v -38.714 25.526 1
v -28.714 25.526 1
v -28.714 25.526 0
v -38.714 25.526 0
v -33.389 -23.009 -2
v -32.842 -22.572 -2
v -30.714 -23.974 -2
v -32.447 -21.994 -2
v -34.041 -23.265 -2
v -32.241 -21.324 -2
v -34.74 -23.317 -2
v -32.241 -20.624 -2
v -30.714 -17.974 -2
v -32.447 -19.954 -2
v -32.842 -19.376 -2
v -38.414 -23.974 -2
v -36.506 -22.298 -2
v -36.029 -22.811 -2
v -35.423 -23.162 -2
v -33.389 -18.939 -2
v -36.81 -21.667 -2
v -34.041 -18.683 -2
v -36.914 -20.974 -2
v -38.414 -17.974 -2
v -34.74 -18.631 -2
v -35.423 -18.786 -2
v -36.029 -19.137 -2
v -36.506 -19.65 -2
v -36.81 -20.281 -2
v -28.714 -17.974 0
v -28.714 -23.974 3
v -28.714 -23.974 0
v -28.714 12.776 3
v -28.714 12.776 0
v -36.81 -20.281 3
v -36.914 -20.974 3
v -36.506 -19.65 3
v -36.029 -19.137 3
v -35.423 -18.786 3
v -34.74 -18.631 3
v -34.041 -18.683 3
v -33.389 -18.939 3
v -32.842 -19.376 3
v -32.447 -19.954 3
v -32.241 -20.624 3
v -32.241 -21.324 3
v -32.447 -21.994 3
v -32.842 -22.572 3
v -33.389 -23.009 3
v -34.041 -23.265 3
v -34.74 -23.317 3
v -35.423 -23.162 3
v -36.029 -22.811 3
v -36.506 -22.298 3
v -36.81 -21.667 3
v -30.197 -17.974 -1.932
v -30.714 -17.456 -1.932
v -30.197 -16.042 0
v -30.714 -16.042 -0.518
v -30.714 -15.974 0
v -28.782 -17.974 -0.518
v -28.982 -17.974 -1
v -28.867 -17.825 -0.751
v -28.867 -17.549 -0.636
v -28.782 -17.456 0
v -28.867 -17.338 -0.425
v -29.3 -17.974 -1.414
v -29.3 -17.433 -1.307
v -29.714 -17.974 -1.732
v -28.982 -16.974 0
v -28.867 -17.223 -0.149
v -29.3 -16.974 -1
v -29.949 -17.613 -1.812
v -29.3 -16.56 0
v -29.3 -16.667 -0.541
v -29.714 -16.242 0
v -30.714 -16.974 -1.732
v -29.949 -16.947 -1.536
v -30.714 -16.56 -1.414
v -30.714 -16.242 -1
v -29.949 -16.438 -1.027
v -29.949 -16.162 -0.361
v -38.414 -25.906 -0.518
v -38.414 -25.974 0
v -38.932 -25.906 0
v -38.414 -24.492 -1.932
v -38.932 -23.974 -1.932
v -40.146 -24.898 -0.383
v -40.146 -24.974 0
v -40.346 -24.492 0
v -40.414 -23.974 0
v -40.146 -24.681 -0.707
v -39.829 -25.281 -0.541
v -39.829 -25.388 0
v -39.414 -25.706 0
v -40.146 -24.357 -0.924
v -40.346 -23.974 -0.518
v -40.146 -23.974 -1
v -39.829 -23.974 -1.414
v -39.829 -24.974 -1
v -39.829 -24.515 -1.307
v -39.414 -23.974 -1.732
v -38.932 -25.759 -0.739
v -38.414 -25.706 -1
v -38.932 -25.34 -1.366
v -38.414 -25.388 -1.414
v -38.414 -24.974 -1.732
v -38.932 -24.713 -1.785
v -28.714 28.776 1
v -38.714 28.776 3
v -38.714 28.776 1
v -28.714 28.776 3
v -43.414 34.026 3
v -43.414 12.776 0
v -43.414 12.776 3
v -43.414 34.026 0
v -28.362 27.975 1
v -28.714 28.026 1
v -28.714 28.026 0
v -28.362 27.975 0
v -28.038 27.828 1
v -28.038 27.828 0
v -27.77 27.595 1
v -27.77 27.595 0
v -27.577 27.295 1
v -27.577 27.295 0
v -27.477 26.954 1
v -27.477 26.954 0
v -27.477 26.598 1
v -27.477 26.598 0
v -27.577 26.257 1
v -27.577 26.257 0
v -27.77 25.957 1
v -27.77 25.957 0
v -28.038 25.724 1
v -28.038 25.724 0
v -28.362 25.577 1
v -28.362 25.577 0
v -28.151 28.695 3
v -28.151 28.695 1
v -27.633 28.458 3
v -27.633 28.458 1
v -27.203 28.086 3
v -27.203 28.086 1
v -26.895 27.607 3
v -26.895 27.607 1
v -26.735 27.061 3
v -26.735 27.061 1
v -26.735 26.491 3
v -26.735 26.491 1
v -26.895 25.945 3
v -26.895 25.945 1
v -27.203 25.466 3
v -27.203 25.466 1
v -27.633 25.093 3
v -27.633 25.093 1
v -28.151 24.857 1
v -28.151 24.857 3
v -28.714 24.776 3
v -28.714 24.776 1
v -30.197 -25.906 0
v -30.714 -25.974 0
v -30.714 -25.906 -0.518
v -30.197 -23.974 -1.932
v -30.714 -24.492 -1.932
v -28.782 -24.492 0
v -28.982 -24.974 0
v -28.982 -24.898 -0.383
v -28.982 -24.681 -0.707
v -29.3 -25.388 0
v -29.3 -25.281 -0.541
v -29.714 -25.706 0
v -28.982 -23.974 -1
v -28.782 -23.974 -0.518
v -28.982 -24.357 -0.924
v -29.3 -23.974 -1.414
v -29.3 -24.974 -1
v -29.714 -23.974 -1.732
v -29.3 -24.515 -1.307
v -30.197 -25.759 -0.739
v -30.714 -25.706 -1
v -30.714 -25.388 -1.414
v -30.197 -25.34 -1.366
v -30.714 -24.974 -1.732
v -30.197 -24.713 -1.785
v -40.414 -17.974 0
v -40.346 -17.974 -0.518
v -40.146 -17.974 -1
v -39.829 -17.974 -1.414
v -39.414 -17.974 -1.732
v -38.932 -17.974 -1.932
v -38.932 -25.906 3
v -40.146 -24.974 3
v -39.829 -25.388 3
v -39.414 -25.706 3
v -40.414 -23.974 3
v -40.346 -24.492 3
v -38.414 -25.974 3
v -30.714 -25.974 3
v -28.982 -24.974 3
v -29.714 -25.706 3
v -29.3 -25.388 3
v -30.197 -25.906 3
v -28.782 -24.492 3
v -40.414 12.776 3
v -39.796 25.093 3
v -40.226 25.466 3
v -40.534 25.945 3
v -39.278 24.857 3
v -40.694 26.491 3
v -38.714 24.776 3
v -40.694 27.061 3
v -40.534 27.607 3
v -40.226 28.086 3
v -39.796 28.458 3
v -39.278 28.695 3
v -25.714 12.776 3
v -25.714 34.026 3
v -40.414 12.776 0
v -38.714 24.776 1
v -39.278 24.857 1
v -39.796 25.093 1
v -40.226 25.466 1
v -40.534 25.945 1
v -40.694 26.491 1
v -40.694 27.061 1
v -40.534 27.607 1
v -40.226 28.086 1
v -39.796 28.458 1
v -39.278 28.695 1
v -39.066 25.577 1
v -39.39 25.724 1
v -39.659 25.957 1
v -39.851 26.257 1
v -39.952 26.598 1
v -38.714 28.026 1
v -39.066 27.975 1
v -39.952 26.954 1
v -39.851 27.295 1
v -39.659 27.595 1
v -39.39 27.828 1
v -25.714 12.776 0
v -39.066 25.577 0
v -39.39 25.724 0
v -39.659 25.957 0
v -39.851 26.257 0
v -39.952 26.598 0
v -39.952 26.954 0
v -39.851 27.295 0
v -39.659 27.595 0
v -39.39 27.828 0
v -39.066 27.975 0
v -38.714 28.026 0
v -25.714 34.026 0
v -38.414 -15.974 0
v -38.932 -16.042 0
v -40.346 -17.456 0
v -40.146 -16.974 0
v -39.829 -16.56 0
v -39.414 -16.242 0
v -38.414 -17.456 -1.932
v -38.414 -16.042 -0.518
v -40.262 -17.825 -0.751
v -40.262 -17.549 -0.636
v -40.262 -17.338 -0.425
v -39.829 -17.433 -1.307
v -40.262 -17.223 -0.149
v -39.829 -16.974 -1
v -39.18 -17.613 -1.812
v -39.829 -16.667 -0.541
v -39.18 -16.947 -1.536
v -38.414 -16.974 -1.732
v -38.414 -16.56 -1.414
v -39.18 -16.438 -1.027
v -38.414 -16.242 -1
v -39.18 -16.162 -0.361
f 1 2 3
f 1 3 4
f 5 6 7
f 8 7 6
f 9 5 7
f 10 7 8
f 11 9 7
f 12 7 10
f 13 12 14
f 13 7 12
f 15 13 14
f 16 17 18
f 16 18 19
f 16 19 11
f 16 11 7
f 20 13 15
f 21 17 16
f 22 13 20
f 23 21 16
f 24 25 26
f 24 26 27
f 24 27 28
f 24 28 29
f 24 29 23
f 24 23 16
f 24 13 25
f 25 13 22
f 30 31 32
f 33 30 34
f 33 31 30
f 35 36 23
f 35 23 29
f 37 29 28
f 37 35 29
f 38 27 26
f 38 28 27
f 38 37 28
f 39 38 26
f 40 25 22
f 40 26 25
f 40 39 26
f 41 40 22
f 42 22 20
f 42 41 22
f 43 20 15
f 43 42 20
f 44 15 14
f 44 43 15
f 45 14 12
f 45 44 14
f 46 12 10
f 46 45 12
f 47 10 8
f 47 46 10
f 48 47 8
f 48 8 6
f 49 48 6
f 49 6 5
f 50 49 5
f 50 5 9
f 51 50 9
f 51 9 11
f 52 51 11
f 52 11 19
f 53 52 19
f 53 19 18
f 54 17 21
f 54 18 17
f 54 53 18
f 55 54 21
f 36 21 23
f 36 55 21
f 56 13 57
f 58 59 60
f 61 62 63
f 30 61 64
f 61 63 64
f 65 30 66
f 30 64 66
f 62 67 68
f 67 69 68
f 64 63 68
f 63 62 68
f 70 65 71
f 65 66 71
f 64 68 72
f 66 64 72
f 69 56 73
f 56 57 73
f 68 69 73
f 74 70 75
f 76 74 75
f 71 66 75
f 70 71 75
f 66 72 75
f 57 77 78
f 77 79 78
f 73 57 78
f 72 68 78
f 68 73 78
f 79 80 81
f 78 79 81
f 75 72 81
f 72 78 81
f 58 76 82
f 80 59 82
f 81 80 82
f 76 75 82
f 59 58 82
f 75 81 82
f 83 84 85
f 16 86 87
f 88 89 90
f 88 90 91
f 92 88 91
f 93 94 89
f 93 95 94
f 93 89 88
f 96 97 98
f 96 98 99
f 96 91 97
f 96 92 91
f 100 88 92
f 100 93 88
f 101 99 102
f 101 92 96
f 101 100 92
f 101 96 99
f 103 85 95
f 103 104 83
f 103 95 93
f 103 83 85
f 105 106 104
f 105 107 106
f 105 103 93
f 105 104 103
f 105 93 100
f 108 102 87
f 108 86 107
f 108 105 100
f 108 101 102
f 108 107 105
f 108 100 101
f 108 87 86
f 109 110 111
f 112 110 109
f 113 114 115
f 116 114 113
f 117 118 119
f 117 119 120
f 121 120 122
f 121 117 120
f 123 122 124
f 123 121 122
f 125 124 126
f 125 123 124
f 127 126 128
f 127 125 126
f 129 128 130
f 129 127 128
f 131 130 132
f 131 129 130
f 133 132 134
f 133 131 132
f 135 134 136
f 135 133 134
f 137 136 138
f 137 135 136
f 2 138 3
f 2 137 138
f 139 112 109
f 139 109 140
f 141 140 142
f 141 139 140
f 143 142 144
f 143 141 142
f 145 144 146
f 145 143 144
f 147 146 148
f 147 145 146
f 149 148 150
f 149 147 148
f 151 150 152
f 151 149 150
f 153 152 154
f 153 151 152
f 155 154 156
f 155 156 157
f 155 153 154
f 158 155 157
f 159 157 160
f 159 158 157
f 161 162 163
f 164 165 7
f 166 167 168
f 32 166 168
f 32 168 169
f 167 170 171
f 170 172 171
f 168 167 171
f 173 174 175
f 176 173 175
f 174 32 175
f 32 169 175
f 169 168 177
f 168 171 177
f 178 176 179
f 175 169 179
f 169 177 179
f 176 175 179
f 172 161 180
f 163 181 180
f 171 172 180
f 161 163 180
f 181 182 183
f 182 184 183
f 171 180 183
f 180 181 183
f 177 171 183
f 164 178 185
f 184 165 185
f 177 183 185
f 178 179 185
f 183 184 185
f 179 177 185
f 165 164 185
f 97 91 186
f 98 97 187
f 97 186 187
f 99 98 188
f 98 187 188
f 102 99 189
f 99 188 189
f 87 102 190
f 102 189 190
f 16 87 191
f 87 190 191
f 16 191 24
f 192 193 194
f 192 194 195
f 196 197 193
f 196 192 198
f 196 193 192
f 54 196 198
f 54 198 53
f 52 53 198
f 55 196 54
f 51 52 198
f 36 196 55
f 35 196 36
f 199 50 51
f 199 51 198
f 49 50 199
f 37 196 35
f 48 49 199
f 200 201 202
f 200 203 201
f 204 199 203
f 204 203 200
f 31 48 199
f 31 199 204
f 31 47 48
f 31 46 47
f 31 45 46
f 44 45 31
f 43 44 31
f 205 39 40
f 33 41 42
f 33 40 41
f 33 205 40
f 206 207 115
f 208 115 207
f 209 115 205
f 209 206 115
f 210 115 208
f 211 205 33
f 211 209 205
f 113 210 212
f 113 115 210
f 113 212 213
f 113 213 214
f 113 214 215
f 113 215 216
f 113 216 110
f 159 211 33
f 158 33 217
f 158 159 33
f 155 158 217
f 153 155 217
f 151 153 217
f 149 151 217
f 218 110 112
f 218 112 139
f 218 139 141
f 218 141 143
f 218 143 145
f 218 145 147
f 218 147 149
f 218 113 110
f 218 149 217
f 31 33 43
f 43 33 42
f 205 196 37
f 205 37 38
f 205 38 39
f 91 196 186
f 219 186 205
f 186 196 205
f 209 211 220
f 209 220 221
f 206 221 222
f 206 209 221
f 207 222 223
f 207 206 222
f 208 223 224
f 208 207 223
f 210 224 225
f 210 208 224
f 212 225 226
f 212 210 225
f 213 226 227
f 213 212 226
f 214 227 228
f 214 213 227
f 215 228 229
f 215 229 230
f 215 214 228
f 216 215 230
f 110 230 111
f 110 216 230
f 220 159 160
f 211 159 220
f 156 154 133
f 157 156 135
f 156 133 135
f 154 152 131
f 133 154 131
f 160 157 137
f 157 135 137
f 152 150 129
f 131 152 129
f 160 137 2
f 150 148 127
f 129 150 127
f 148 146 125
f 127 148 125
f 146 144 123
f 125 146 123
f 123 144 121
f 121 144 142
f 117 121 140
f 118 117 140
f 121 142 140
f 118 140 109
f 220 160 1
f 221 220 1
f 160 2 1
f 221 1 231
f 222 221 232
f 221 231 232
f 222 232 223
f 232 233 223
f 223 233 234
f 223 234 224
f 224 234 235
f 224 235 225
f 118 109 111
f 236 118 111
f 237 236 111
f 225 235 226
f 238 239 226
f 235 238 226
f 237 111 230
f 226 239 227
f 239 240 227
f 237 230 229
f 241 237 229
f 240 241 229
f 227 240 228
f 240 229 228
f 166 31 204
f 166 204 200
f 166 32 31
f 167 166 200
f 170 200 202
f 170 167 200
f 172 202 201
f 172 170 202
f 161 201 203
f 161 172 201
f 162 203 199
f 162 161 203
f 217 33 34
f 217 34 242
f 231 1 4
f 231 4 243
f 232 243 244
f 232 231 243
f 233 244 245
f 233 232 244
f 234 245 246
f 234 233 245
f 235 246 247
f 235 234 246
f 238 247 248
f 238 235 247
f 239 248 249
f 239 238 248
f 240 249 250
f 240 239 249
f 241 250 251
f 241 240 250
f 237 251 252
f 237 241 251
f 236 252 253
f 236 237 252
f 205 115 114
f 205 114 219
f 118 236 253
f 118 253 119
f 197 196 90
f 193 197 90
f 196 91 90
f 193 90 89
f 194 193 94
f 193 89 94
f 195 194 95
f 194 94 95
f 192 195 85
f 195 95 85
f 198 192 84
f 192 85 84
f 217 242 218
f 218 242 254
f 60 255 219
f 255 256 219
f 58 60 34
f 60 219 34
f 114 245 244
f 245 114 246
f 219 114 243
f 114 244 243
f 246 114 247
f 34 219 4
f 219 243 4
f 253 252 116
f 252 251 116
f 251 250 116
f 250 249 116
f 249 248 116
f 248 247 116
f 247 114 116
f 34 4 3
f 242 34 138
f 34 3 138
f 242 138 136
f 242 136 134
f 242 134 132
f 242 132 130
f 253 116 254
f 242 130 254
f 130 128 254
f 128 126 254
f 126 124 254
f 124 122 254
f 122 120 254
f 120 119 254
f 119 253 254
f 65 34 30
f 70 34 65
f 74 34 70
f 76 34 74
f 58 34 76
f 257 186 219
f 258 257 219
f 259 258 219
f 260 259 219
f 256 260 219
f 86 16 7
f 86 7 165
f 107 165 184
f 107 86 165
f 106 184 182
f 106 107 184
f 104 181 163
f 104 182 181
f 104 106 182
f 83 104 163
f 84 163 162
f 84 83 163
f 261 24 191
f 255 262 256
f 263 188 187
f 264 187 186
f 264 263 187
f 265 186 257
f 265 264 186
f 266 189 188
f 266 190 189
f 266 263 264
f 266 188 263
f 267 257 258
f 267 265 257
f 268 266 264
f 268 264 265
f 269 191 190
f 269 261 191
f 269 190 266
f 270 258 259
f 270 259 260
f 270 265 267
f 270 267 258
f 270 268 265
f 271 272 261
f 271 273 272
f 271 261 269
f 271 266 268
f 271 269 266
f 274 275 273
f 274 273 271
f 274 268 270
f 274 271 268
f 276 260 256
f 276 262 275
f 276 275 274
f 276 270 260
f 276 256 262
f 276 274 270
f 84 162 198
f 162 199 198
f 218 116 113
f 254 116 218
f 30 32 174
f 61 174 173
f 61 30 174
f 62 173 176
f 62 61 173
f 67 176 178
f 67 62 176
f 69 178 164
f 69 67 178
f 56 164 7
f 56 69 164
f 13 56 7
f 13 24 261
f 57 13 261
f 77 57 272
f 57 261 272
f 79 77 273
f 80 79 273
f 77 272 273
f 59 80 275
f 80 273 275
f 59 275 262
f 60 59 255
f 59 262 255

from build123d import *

# Parameters (mm, degrees)
SKETCH1_W               = 17.7
SKETCH1_H               = 60
BOSS_EXTRUDE1_DEPTH     = 3
SKETCH2_W               = 3
SKETCH2_H               = 38.75
CUT_EXTRUDE1_DEPTH      = 56.240991234
CUT_EXTRUDE2_DEPTH      = 56.240991234
CUT_EXTRUDE3_DEPTH      = 2
SKETCH5_W               = 11.7
SKETCH5_H               = 10
BOSS_EXTRUDE2_DEPTH     = 2
CUT_EXTRUDE4_DEPTH      = 56.385621893
CUT_EXTRUDE4_DEPTH_BACK = 56.385621893
SKETCH6_R               = 2.35
FILLET1_R               = 2
FILLET2_R               = 2
FILLET3_R               = 2
FILLET4_R               = 2


with BuildPart() as part:
    # Sketch1 → Boss-Extrude1 (new body)
    with BuildSketch(Plane.XY):
        with Locations((-34.564285714, 4.025974026)):
            Rectangle(SKETCH1_W, SKETCH1_H)
    extrude(amount=BOSS_EXTRUDE1_DEPTH)

    # Sketch2 → Cut-Extrude1 (cut, through all)
    with BuildSketch(Plane.XY.offset(3)):
        with Locations((-41.914285714, -6.599025974)):
            Rectangle(SKETCH2_W, SKETCH2_H)
        with Locations((-27.214285714, -6.599025974)):
            Rectangle(SKETCH2_W, SKETCH2_H)
    extrude(amount=-CUT_EXTRUDE1_DEPTH, mode=Mode.SUBTRACT)

    # Sketch3 → Cut-Extrude2 (cut, through all)
    with BuildSketch(Plane.XY.offset(3)):
        with BuildLine():
            Line((-28.714285714, 25.525974026), (-38.714285714, 25.525974026))
            ThreePointArc((-38.714285714, 25.525974026), (-39.964285714, 26.775974026), (-38.714285714, 28.025974026))
            Line((-38.714285714, 28.025974026), (-28.714285714, 28.025974026))
            ThreePointArc((-28.714285714, 28.025974026), (-27.464285714, 26.775974026), (-28.714285714, 25.525974026))
        make_face()
    extrude(amount=-CUT_EXTRUDE2_DEPTH, mode=Mode.SUBTRACT)

    # Sketch4 → Cut-Extrude3 (cut)
    with BuildSketch(Plane.XY.offset(3)):
        with BuildLine():
            Line((-38.714285714, 28.775974026), (-28.714285714, 28.775974026))
            ThreePointArc((-28.714285714, 28.775974026), (-26.714285714, 26.775974026), (-28.714285714, 24.775974026))
            Line((-28.714285714, 24.775974026), (-38.714285714, 24.775974026))
            ThreePointArc((-38.714285714, 24.775974026), (-40.714285714, 26.775974026), (-38.714285714, 28.775974026))
        make_face()
    extrude(amount=-CUT_EXTRUDE3_DEPTH, mode=Mode.SUBTRACT)

    # Sketch5 → Boss-Extrude2 (add)
    with BuildSketch(Plane(origin=(0, 0, 0), x_dir=(-1, 0, 0), z_dir=(0, 0, -1))):
        with Locations((34.564285714, -20.974025974)):
            Rectangle(SKETCH5_W, SKETCH5_H)
    extrude(amount=BOSS_EXTRUDE2_DEPTH)

    # Sketch6 → Cut-Extrude4 (cut, two sides: drawn at the far end of the back side and taken through both)
    with BuildSketch(Plane(origin=(0, 0, -2), x_dir=(-1, 0, 0), z_dir=(0, 0, -1)).offset(-CUT_EXTRUDE4_DEPTH_BACK)):
        with Locations((34.564285714, -20.974025974)):
            Circle(SKETCH6_R)
    extrude(amount=CUT_EXTRUDE4_DEPTH + CUT_EXTRUDE4_DEPTH_BACK, mode=Mode.SUBTRACT)

    # Fillet1
    fillet1_edges = [part.edges().sort_by_distance(p)[0] for p in [
        (-34.564285714, -25.974025974, -2),
    ]]
    fillet(fillet1_edges, radius=FILLET1_R)

    # Fillet2
    fillet2_edges = [part.edges().sort_by_distance(p)[0] for p in [
        (-34.564285714, -15.974025974, -2),
    ]]
    fillet(fillet2_edges, radius=FILLET2_R - 0.0001)  # a hair under: the kernel refuses the full size

    # Fillet3
    fillet3_edges = [part.edges().sort_by_distance(p)[0] for p in [
        (-28.714285714, -25.974025974, 1.5),
        (-28.714285714, -25.388239536, -1.414213562),
        (-28.714285714, -20.973975974, -2),
        (-28.714285714, -16.559783122, -1.414242852),
    ]]
    fillet(fillet3_edges, radius=FILLET3_R - 0.0001)  # a hair under: the kernel refuses the full size

    # Fillet4
    fillet4_edges = [part.edges().sort_by_distance(p)[0] for p in [
        (-40.414285714, -20.973975974, -2),
        (-40.414285714, -25.974025974, 1.5),
        (-40.414285714, -25.388239536, -1.414213562),
        (-40.414285714, -16.559783122, -1.414242852),
    ]]
    fillet(fillet4_edges, radius=FILLET4_R - 0.0001)  # a hair under: the kernel refuses the full size


solid = part.part
